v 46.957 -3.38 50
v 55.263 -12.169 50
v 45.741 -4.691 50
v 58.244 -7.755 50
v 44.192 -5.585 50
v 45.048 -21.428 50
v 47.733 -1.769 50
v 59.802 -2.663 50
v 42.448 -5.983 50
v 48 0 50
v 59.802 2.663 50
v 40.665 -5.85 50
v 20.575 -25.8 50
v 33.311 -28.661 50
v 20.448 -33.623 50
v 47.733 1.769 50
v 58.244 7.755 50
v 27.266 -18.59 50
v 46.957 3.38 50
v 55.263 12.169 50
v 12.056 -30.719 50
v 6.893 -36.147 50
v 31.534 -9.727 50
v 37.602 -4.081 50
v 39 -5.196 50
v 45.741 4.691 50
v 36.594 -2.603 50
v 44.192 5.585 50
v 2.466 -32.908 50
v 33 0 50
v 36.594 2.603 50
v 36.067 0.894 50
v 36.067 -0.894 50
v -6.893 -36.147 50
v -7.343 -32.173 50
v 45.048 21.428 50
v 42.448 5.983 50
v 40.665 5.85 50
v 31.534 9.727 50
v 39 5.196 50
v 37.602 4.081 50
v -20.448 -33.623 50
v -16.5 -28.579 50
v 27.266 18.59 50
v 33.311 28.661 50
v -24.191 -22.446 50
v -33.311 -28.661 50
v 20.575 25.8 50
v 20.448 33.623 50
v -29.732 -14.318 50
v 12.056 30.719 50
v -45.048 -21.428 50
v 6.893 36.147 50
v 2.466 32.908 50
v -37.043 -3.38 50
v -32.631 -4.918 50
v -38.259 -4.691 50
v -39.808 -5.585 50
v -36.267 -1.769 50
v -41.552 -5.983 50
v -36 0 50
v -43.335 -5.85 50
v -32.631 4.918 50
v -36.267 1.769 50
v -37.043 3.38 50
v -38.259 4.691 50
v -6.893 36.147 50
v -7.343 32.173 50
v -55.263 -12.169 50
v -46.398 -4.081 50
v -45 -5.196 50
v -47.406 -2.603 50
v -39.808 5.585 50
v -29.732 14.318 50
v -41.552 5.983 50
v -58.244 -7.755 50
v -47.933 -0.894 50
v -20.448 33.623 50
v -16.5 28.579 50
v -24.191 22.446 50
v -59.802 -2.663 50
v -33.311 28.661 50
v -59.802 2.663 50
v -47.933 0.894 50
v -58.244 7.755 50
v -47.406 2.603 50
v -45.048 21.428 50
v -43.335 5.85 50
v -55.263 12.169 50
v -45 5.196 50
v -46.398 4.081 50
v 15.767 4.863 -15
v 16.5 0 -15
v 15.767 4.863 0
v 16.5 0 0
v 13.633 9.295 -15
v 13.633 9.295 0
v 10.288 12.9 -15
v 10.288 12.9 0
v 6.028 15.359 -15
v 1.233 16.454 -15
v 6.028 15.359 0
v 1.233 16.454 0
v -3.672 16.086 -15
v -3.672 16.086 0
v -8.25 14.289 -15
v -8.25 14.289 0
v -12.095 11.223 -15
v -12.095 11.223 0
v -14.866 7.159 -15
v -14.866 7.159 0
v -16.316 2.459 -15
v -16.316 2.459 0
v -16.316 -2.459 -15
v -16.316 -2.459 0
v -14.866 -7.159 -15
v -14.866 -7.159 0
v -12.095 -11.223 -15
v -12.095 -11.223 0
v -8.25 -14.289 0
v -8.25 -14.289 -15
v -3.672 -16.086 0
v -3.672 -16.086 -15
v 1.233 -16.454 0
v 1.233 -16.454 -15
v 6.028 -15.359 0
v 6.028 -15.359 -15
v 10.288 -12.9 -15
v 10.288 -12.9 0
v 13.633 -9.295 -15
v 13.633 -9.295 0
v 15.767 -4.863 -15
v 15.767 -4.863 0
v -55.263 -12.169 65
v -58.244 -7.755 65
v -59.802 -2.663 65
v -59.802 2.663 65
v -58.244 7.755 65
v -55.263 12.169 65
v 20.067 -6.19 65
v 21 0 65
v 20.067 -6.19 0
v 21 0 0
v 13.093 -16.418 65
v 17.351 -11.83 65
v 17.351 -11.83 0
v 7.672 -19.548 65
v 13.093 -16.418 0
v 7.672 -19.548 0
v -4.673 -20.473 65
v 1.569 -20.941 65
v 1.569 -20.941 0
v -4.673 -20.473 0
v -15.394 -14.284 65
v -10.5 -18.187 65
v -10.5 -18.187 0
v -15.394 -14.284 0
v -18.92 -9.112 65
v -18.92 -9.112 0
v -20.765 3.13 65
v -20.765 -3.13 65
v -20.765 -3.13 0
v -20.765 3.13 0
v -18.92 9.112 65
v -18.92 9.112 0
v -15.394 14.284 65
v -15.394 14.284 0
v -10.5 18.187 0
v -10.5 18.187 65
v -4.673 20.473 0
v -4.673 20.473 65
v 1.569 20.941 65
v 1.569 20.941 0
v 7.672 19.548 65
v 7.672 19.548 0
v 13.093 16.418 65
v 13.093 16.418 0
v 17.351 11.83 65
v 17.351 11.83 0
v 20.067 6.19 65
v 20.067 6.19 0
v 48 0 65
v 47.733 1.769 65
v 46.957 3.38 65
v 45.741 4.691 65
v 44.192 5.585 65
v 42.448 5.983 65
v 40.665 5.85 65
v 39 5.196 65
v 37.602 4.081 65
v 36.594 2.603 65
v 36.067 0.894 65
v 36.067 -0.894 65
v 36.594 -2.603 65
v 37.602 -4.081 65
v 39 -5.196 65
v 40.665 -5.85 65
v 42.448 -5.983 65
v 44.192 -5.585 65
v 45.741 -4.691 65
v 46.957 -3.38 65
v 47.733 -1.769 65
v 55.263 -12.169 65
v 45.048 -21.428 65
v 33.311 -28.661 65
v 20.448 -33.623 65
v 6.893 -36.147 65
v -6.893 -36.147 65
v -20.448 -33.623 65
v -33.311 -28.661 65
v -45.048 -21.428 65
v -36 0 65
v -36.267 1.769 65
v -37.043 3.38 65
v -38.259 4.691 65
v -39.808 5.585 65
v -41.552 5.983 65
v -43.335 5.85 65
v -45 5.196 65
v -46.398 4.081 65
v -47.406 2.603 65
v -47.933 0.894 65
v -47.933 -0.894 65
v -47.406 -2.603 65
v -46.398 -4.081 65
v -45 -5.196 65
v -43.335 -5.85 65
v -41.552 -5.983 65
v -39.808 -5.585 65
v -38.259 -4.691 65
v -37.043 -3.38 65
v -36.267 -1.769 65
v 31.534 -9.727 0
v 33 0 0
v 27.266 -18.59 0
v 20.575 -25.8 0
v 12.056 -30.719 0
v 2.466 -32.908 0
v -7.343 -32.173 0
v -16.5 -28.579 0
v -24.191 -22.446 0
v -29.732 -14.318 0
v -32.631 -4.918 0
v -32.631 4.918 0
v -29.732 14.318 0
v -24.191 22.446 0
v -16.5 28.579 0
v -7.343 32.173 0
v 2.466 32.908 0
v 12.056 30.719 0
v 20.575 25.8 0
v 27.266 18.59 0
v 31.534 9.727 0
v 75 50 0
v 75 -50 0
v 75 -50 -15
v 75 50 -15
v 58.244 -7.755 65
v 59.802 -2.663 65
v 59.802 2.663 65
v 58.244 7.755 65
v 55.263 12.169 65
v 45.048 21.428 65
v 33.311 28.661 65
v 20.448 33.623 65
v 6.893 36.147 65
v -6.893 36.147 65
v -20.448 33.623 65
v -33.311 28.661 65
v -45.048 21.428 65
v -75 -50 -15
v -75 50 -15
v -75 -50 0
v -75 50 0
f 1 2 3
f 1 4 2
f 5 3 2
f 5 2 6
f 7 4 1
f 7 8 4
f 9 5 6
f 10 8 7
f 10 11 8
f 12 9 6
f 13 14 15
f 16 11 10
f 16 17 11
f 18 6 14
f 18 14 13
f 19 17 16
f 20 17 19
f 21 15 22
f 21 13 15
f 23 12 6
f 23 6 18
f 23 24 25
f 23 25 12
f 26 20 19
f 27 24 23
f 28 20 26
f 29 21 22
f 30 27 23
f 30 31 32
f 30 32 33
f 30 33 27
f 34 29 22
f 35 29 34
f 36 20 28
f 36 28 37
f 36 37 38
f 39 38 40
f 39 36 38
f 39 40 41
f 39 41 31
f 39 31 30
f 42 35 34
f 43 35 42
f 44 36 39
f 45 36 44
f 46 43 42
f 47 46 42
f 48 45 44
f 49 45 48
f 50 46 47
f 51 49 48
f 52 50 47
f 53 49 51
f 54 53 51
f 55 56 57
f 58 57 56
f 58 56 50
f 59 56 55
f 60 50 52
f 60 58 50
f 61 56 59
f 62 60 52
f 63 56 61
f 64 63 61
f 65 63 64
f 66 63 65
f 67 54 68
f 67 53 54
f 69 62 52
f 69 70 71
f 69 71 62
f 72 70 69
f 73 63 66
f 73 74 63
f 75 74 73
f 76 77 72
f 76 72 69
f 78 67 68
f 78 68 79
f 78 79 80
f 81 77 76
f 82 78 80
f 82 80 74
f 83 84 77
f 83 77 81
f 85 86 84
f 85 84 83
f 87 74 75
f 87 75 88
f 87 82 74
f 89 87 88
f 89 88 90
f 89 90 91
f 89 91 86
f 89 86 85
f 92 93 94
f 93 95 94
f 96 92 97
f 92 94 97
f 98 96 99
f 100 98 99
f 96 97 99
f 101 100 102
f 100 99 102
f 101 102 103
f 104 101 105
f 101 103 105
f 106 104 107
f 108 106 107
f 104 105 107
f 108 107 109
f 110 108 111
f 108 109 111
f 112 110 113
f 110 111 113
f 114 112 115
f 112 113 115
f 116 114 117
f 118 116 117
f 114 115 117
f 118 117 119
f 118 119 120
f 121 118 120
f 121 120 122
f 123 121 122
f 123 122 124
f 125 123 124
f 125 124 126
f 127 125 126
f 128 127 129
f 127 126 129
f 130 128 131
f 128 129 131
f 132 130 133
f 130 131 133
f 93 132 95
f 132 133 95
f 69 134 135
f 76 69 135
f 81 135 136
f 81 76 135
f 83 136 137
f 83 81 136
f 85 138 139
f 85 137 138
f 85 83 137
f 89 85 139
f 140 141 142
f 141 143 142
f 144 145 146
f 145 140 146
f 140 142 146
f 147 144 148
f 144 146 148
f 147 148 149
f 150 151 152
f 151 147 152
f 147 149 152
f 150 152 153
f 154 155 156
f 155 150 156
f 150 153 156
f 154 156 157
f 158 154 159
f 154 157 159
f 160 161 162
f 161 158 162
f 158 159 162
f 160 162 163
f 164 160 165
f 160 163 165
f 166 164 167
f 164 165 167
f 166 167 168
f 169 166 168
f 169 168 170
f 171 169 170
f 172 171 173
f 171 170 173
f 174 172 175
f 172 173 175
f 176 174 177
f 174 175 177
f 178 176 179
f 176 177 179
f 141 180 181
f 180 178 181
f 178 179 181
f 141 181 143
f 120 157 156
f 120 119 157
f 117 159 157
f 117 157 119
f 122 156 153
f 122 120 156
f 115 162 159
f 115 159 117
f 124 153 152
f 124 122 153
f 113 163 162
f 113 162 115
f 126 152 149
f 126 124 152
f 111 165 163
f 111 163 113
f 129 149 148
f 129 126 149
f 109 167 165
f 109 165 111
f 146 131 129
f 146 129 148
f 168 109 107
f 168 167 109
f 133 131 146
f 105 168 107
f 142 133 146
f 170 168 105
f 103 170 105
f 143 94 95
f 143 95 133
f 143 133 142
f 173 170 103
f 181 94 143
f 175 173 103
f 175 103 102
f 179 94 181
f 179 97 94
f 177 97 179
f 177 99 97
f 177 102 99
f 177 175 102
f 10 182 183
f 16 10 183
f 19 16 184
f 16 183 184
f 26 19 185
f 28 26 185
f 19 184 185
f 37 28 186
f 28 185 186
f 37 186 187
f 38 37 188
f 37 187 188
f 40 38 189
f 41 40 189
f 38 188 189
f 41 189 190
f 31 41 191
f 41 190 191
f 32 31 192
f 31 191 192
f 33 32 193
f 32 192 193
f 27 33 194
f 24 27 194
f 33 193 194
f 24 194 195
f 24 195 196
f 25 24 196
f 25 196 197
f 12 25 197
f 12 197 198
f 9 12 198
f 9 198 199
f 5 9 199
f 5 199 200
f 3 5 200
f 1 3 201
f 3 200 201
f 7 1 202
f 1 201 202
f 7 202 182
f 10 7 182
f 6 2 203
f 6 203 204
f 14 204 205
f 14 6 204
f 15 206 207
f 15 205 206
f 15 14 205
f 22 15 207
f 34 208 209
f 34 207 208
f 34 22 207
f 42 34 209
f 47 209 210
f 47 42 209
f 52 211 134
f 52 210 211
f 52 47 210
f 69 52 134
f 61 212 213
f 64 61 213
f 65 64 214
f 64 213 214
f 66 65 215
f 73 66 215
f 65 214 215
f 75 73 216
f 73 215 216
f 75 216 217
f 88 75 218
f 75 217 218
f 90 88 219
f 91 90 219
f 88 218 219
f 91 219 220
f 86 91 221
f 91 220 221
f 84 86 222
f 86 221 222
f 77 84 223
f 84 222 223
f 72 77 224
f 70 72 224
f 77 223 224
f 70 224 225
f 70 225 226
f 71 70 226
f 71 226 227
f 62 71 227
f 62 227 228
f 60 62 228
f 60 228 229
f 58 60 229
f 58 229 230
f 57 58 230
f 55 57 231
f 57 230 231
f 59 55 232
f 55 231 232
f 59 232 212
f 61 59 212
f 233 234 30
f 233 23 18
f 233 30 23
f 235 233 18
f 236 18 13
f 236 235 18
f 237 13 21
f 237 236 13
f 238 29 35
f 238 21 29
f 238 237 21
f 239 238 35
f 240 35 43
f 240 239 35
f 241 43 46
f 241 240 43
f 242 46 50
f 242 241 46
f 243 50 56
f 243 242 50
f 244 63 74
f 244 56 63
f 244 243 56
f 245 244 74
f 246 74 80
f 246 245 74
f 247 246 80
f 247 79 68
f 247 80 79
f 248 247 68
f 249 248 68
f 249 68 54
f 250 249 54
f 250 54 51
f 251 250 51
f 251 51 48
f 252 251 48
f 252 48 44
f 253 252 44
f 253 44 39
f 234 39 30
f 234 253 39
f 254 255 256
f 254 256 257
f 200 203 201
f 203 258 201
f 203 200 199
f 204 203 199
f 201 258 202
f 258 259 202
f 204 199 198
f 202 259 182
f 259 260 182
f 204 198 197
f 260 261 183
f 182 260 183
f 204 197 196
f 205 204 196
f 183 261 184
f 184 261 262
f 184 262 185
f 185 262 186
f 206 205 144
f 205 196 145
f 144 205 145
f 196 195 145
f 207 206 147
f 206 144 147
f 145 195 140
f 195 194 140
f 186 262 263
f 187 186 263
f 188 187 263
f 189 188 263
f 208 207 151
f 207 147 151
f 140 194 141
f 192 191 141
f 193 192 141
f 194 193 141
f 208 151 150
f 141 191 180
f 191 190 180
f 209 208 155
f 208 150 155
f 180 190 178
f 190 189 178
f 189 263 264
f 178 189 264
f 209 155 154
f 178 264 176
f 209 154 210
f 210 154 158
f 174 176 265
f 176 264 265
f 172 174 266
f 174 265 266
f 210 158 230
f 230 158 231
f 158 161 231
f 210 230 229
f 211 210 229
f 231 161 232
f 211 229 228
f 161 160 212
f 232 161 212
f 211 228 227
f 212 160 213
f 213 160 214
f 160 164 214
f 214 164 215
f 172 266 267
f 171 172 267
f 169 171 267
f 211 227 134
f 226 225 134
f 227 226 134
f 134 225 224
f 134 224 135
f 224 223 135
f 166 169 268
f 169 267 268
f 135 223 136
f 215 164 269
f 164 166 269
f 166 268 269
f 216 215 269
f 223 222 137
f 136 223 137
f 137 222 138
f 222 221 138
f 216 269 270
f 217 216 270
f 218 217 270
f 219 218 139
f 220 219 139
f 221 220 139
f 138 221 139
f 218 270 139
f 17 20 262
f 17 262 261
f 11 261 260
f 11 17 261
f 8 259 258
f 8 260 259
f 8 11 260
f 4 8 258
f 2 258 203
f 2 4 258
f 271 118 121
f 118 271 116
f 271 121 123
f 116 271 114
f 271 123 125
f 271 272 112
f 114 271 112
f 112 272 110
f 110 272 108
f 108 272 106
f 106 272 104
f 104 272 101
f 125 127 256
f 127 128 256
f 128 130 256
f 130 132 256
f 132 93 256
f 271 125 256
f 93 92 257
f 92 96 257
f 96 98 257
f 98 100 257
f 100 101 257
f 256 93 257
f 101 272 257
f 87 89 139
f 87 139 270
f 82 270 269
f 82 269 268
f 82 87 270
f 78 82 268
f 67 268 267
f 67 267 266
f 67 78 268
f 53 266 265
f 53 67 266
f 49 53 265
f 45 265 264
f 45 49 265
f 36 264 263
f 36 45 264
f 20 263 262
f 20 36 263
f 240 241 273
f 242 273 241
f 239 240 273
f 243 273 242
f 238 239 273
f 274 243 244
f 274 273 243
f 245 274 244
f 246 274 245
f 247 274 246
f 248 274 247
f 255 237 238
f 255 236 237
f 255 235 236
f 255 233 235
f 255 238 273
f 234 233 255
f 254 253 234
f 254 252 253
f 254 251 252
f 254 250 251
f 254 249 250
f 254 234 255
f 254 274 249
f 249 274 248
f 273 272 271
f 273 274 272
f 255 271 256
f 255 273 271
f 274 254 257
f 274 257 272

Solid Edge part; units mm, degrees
sketch "Sketch1" plane through (0, 0, 0) normal (0, 0, 1) x (1, 0, 0)
  line L0 (75, -50) -> (75, 50)
  line L1 (75, 50) -> (-75, 50)
  line L2 (-75, 50) -> (-75, -50)
  line L3 (-75, -50) -> (75, -50)
extrude "Protrusion1" add sketch "Sketch1" against normal blind 15
sketch "Sketch2" plane through (0, 0, 0) normal (0, 0, 1) x (1, 0, 0)
  circle A0 centre (0, 0) radius 33
extrude "ExtrudedProtrusion_2" add sketch "Sketch2" along normal blind 50
sketch "Sketch3" plane through (0, 0, 50) normal (0, 0, 1) x (1, 0, 0)
  arc A0 (-55.2632, 12.1692) -> (55.2632, 12.1692) centre (0, -38.5357) cw
  arc A1 (55.2632, -12.1692) -> (55.2632, 12.1692) centre (42, 0) ccw
  arc A2 (-55.2632, -12.1692) -> (55.2632, -12.1692) centre (0, 38.5357) ccw
  arc A3 (-55.2632, 12.1692) -> (-55.2632, -12.1692) centre (-42, 0) ccw
extrude "ExtrudedProtrusion_3" add sketch "Sketch3" along normal blind 15
sketch "Sketch4" plane through (0, 0, 0) normal (0, -1, 0) x (1, 0, 0)
  line L0 (21, 65) -> (21, 0)
  line L1 (21, 0) -> (16.5, 0)
  line L2 (16.5, -15) -> (16.5, 0)
  line L3 (0, -15) -> (16.5, -15)
  line L4 (0, -15) -> (0, 65)
  line L5 (0, 65) -> (21, 65)
revolve "RevolvedCutout1" cut sketch "Sketch4" angle 360 about axis through (0, 0, -15) along (0, 0, 1)
sketch "Sketch5" plane through (0, 0, 65) normal (0, 0, 1) x (1, 0, 0)
  circle A0 centre (42, 0) radius 6
  circle A1 centre (-42, 0) radius 6
extrude "ExtrudedCutout_1" cut sketch "Sketch5" against normal blind 15
properties material "StCst10 GOST 1412-85"
